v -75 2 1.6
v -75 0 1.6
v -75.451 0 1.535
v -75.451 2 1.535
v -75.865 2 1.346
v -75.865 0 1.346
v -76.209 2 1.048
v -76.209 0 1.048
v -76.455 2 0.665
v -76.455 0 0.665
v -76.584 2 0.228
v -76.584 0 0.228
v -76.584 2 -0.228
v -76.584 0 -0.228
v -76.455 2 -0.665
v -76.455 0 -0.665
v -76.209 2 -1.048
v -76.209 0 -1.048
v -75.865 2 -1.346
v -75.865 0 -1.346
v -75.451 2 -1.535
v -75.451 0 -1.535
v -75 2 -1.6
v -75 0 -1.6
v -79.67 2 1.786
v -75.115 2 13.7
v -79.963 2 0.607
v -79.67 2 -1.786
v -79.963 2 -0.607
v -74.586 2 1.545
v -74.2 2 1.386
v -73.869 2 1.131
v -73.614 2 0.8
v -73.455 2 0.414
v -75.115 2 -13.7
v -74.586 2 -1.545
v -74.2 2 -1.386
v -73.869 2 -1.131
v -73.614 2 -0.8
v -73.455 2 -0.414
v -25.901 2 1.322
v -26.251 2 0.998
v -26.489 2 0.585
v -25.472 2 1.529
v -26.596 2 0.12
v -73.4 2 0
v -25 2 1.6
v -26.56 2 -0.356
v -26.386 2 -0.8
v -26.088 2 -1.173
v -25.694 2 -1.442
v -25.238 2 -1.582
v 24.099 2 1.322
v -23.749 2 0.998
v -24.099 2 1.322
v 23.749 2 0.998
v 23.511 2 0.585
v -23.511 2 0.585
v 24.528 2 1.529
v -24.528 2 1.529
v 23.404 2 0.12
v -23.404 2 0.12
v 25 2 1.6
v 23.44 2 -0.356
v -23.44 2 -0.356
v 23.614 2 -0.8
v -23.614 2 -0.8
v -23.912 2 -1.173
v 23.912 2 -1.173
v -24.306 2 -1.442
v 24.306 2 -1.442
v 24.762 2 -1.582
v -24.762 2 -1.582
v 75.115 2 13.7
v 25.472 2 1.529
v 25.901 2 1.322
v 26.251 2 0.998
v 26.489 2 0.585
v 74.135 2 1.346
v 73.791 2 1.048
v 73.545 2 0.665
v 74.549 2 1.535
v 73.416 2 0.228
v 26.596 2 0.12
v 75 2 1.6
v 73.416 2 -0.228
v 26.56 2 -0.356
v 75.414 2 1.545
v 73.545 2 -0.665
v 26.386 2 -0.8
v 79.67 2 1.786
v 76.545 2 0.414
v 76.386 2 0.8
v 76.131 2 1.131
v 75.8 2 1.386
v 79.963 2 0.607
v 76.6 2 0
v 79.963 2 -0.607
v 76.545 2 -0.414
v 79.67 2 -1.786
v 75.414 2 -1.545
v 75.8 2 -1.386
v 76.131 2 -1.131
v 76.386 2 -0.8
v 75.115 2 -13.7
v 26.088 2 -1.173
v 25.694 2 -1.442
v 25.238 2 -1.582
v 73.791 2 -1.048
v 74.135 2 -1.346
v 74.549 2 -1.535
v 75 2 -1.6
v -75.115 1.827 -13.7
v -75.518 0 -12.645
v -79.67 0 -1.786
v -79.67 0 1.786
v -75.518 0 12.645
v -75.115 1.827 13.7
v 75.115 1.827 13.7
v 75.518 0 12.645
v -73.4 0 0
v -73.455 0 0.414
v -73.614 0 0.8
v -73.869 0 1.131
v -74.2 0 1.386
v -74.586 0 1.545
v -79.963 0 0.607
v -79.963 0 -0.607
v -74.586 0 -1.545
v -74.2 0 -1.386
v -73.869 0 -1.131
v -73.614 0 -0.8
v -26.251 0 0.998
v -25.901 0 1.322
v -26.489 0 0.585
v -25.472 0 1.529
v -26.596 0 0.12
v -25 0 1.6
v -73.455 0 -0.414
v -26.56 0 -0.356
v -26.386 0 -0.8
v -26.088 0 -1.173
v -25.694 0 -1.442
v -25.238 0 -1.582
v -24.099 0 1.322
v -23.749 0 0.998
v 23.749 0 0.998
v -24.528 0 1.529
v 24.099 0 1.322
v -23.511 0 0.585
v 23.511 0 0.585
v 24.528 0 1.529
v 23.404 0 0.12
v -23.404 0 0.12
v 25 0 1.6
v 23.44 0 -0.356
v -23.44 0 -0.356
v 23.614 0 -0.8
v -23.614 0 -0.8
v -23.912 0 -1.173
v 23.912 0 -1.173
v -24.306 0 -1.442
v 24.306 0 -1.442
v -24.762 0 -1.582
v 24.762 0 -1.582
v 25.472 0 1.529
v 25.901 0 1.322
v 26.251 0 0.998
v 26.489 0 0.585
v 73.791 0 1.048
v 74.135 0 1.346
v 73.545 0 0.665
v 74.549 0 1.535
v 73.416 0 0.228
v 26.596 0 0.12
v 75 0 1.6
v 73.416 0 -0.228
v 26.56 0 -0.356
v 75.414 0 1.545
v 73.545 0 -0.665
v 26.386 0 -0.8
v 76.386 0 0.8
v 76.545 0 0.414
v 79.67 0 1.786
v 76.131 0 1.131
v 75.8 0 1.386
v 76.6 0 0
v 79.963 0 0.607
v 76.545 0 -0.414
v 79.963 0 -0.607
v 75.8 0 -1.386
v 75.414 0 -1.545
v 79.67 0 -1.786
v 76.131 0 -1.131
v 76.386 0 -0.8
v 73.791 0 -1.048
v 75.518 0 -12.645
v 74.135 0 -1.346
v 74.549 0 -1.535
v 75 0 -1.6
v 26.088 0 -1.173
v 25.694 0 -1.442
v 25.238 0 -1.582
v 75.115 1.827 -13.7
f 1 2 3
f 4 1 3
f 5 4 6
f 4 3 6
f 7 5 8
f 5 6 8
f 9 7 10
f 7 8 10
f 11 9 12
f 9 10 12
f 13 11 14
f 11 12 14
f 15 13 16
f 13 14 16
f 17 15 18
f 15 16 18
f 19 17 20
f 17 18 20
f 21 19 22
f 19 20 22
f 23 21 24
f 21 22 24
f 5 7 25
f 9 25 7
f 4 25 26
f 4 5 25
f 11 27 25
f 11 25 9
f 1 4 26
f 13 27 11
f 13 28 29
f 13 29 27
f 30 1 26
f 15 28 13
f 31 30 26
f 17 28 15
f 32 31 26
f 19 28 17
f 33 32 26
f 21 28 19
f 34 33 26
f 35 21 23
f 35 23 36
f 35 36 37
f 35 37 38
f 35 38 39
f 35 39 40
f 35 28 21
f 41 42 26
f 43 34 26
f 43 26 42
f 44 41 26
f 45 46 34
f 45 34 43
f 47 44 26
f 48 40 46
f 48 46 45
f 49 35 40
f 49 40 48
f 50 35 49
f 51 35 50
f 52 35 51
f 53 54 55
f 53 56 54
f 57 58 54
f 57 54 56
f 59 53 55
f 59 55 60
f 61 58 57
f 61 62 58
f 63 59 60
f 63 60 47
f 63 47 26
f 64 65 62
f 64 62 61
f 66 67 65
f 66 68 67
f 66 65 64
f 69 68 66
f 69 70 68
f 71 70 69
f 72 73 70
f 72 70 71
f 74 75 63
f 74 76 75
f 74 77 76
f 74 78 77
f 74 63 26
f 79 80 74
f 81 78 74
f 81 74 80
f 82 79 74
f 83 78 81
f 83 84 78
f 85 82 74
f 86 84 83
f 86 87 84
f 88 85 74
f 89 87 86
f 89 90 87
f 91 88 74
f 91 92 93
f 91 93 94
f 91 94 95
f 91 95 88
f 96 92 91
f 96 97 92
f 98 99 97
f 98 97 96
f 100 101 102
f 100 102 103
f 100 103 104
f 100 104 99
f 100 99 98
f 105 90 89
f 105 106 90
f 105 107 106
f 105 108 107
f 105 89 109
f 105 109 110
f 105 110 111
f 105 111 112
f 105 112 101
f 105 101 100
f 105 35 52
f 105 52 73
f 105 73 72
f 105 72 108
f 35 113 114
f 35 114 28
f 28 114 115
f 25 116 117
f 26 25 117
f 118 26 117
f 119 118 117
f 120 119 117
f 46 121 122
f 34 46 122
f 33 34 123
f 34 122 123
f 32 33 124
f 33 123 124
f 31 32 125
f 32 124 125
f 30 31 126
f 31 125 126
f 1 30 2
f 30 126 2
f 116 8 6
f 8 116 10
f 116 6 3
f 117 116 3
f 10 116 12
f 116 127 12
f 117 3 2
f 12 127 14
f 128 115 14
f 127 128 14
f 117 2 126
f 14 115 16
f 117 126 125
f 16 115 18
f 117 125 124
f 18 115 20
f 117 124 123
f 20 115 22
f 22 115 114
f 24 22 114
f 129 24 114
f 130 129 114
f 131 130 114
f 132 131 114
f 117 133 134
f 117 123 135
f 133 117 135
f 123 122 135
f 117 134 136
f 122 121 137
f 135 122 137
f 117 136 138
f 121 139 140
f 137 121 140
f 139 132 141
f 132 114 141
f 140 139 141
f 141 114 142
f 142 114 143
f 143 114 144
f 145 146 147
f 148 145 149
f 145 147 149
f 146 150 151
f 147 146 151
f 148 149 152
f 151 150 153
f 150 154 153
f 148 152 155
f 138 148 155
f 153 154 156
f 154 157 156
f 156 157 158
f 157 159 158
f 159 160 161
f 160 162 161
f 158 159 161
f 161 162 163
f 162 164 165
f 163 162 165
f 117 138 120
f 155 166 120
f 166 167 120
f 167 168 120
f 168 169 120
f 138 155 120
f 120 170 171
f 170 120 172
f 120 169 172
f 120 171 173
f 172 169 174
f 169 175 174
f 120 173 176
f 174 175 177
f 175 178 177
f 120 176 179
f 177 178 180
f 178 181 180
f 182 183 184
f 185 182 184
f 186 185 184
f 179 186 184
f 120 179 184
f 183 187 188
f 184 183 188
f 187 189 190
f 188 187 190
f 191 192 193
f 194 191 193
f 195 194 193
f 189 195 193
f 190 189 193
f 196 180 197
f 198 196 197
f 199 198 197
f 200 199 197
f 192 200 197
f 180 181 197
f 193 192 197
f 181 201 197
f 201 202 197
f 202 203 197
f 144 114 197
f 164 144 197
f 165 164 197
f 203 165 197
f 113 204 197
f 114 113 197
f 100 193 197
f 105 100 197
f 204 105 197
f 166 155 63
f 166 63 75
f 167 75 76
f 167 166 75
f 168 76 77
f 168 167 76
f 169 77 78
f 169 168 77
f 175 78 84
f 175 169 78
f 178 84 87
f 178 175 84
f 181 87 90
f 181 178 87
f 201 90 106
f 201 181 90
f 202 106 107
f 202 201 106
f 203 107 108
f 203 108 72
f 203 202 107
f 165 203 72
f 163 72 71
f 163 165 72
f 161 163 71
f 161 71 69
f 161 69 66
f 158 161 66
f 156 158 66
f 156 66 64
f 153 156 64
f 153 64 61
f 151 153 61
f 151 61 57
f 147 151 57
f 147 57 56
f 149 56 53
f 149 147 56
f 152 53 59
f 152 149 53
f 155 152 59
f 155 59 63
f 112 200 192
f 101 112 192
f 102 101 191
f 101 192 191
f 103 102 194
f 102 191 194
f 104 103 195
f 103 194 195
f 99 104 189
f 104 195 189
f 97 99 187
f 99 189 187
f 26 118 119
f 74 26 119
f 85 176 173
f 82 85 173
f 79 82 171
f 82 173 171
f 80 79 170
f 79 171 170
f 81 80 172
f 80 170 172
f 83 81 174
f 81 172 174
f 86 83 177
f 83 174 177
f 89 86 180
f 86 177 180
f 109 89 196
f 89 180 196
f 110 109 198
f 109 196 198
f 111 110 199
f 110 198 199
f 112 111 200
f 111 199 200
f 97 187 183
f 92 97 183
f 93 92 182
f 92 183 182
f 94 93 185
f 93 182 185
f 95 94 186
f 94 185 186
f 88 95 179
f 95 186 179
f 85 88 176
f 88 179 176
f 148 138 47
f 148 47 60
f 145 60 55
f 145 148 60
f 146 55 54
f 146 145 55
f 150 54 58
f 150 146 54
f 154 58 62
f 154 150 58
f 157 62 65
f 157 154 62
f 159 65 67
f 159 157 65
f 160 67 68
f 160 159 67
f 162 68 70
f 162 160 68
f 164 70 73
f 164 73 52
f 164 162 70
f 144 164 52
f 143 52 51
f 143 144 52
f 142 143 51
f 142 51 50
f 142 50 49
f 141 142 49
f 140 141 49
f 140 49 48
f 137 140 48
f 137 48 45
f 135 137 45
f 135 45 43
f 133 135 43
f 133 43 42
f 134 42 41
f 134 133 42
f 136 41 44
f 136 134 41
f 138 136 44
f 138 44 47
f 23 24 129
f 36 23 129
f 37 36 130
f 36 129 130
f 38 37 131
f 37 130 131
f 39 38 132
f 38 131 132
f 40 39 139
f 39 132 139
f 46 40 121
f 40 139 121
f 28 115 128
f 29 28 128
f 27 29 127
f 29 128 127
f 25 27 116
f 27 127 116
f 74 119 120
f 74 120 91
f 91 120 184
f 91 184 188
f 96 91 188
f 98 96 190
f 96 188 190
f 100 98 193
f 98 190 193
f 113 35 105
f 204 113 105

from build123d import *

# Parameters (mm, degrees)
SKETCH_1_R          = 1.6
EXTRUDE_1_DEPTH     = 2
CUT_EXTRUDE_1_DEPTH = 161.623784042
CHAMFER_1_SIZE      = 0.2
CHAMFER_1_SIZE2     = 0.1
CHAMFER_2_SIZE2     = 0.2
CHAMFER_2_SIZE      = 0.1


with BuildPart() as part:
    # Эскиз1 → Бобышка-Вытянуть1 (new body)
    # profile 1 of 3: a face of its own
    with BuildSketch(Plane(origin=(0, 0, 0), x_dir=(1, 0, 0), z_dir=(0, 1, 0))):
        with BuildLine():
            Line((75, 14), (-75, 14))
            Line((-75, 14), (-75, 1.6))
            ThreePointArc((-75, 1.6), (-73.86862915, 1.13137085), (-73.4, 0))
            ThreePointArc((-73.4, 0), (-73.86862915, -1.13137085), (-75, -1.6))
            Line((-75, -1.6), (-75, -14))
            Line((-75, -14), (75, -14))
            Line((75, -14), (75, -1.6))
            ThreePointArc((75, -1.6), (73.4, 0), (75, 1.6))
            Line((75, 1.6), (75, 14))
        make_face()
        with Locations(Location((-25, 0, 0), (0, 0, 270))):
            Circle(SKETCH_1_R, mode=Mode.SUBTRACT)
        with Locations(Location((25, 0, 0), (0, 0, 270))):
            Circle(SKETCH_1_R, mode=Mode.SUBTRACT)
    # profile 2 of 3: a face of its own
    with BuildSketch(Plane(origin=(0, 0, 0), x_dir=(1, 0, 0), z_dir=(0, 1, 0))):
        with BuildLine():
            Line((79.670248868, 1.785714286), (75, 14))
            Line((75, 14), (75, 1.6))
            ThreePointArc((75, 1.6), (76.13137085, 1.13137085), (76.6, 0))
            ThreePointArc((76.6, 0), (76.13137085, -1.13137085), (75, -1.6))
            Line((75, -1.6), (75, -14))
            Line((75, -14), (79.670248868, -1.785714286))
            ThreePointArc((79.670248868, -1.785714286), (80, 0), (79.670248868, 1.785714286))
        make_face()
    # profile 3 of 3: a face of its own
    with BuildSketch(Plane(origin=(0, 0, 0), x_dir=(1, 0, 0), z_dir=(0, 1, 0))):
        with BuildLine():
            Line((-75, 1.6), (-75, 14))
            Line((-75, 14), (-79.670248868, 1.785714286))
            ThreePointArc((-79.670248868, 1.785714286), (-80, 0), (-79.670248868, -1.785714286))
            Line((-79.670248868, -1.785714286), (-75, -14))
            Line((-75, -14), (-75, -1.6))
            ThreePointArc((-75, -1.6), (-76.6, 0), (-75, 1.6))
        make_face()
    extrude(amount=EXTRUDE_1_DEPTH)

    # Эскиз3 → Вырез-Вытянуть1 (cut, through all)
    with BuildSketch(Plane.ZY.offset(80)):
        Polygon((-12.645299462, 0), (-14, 0), (-14, 2), (-13.8, 2), align=None)
        Polygon((14, 0), (14, 2), (13.8, 2), (12.645299462, 0), align=None)
    extrude(amount=-CUT_EXTRUDE_1_DEPTH, mode=Mode.SUBTRACT)

    # Фаска1
    chamfer_1_edges = [part.edges().sort_by_distance(p)[0] for p in [
        (0, 2, -13.8),
    ]]
    chamfer_1_side = [part.faces().sort_by_distance(p)[0] for p in [
        (0, 0.999022738, -13.222085508),
    ]]
    chamfer(chamfer_1_edges, length=CHAMFER_1_SIZE, length2=CHAMFER_1_SIZE2, reference=chamfer_1_side[0])

    # Фаска2
    chamfer_2_edges = [part.edges().sort_by_distance(p)[0] for p in [
        (0, 2, 13.8),
    ]]
    chamfer_2_side = [part.faces().sort_by_distance(p)[0] for p in [
        (0, 2, 13.798),
    ]]
    chamfer(chamfer_2_edges, length=CHAMFER_2_SIZE - 0.0001, length2=CHAMFER_2_SIZE2 - 0.0001, reference=chamfer_2_side[0])  # a hair under: the kernel refuses the full size


solid = part.part
